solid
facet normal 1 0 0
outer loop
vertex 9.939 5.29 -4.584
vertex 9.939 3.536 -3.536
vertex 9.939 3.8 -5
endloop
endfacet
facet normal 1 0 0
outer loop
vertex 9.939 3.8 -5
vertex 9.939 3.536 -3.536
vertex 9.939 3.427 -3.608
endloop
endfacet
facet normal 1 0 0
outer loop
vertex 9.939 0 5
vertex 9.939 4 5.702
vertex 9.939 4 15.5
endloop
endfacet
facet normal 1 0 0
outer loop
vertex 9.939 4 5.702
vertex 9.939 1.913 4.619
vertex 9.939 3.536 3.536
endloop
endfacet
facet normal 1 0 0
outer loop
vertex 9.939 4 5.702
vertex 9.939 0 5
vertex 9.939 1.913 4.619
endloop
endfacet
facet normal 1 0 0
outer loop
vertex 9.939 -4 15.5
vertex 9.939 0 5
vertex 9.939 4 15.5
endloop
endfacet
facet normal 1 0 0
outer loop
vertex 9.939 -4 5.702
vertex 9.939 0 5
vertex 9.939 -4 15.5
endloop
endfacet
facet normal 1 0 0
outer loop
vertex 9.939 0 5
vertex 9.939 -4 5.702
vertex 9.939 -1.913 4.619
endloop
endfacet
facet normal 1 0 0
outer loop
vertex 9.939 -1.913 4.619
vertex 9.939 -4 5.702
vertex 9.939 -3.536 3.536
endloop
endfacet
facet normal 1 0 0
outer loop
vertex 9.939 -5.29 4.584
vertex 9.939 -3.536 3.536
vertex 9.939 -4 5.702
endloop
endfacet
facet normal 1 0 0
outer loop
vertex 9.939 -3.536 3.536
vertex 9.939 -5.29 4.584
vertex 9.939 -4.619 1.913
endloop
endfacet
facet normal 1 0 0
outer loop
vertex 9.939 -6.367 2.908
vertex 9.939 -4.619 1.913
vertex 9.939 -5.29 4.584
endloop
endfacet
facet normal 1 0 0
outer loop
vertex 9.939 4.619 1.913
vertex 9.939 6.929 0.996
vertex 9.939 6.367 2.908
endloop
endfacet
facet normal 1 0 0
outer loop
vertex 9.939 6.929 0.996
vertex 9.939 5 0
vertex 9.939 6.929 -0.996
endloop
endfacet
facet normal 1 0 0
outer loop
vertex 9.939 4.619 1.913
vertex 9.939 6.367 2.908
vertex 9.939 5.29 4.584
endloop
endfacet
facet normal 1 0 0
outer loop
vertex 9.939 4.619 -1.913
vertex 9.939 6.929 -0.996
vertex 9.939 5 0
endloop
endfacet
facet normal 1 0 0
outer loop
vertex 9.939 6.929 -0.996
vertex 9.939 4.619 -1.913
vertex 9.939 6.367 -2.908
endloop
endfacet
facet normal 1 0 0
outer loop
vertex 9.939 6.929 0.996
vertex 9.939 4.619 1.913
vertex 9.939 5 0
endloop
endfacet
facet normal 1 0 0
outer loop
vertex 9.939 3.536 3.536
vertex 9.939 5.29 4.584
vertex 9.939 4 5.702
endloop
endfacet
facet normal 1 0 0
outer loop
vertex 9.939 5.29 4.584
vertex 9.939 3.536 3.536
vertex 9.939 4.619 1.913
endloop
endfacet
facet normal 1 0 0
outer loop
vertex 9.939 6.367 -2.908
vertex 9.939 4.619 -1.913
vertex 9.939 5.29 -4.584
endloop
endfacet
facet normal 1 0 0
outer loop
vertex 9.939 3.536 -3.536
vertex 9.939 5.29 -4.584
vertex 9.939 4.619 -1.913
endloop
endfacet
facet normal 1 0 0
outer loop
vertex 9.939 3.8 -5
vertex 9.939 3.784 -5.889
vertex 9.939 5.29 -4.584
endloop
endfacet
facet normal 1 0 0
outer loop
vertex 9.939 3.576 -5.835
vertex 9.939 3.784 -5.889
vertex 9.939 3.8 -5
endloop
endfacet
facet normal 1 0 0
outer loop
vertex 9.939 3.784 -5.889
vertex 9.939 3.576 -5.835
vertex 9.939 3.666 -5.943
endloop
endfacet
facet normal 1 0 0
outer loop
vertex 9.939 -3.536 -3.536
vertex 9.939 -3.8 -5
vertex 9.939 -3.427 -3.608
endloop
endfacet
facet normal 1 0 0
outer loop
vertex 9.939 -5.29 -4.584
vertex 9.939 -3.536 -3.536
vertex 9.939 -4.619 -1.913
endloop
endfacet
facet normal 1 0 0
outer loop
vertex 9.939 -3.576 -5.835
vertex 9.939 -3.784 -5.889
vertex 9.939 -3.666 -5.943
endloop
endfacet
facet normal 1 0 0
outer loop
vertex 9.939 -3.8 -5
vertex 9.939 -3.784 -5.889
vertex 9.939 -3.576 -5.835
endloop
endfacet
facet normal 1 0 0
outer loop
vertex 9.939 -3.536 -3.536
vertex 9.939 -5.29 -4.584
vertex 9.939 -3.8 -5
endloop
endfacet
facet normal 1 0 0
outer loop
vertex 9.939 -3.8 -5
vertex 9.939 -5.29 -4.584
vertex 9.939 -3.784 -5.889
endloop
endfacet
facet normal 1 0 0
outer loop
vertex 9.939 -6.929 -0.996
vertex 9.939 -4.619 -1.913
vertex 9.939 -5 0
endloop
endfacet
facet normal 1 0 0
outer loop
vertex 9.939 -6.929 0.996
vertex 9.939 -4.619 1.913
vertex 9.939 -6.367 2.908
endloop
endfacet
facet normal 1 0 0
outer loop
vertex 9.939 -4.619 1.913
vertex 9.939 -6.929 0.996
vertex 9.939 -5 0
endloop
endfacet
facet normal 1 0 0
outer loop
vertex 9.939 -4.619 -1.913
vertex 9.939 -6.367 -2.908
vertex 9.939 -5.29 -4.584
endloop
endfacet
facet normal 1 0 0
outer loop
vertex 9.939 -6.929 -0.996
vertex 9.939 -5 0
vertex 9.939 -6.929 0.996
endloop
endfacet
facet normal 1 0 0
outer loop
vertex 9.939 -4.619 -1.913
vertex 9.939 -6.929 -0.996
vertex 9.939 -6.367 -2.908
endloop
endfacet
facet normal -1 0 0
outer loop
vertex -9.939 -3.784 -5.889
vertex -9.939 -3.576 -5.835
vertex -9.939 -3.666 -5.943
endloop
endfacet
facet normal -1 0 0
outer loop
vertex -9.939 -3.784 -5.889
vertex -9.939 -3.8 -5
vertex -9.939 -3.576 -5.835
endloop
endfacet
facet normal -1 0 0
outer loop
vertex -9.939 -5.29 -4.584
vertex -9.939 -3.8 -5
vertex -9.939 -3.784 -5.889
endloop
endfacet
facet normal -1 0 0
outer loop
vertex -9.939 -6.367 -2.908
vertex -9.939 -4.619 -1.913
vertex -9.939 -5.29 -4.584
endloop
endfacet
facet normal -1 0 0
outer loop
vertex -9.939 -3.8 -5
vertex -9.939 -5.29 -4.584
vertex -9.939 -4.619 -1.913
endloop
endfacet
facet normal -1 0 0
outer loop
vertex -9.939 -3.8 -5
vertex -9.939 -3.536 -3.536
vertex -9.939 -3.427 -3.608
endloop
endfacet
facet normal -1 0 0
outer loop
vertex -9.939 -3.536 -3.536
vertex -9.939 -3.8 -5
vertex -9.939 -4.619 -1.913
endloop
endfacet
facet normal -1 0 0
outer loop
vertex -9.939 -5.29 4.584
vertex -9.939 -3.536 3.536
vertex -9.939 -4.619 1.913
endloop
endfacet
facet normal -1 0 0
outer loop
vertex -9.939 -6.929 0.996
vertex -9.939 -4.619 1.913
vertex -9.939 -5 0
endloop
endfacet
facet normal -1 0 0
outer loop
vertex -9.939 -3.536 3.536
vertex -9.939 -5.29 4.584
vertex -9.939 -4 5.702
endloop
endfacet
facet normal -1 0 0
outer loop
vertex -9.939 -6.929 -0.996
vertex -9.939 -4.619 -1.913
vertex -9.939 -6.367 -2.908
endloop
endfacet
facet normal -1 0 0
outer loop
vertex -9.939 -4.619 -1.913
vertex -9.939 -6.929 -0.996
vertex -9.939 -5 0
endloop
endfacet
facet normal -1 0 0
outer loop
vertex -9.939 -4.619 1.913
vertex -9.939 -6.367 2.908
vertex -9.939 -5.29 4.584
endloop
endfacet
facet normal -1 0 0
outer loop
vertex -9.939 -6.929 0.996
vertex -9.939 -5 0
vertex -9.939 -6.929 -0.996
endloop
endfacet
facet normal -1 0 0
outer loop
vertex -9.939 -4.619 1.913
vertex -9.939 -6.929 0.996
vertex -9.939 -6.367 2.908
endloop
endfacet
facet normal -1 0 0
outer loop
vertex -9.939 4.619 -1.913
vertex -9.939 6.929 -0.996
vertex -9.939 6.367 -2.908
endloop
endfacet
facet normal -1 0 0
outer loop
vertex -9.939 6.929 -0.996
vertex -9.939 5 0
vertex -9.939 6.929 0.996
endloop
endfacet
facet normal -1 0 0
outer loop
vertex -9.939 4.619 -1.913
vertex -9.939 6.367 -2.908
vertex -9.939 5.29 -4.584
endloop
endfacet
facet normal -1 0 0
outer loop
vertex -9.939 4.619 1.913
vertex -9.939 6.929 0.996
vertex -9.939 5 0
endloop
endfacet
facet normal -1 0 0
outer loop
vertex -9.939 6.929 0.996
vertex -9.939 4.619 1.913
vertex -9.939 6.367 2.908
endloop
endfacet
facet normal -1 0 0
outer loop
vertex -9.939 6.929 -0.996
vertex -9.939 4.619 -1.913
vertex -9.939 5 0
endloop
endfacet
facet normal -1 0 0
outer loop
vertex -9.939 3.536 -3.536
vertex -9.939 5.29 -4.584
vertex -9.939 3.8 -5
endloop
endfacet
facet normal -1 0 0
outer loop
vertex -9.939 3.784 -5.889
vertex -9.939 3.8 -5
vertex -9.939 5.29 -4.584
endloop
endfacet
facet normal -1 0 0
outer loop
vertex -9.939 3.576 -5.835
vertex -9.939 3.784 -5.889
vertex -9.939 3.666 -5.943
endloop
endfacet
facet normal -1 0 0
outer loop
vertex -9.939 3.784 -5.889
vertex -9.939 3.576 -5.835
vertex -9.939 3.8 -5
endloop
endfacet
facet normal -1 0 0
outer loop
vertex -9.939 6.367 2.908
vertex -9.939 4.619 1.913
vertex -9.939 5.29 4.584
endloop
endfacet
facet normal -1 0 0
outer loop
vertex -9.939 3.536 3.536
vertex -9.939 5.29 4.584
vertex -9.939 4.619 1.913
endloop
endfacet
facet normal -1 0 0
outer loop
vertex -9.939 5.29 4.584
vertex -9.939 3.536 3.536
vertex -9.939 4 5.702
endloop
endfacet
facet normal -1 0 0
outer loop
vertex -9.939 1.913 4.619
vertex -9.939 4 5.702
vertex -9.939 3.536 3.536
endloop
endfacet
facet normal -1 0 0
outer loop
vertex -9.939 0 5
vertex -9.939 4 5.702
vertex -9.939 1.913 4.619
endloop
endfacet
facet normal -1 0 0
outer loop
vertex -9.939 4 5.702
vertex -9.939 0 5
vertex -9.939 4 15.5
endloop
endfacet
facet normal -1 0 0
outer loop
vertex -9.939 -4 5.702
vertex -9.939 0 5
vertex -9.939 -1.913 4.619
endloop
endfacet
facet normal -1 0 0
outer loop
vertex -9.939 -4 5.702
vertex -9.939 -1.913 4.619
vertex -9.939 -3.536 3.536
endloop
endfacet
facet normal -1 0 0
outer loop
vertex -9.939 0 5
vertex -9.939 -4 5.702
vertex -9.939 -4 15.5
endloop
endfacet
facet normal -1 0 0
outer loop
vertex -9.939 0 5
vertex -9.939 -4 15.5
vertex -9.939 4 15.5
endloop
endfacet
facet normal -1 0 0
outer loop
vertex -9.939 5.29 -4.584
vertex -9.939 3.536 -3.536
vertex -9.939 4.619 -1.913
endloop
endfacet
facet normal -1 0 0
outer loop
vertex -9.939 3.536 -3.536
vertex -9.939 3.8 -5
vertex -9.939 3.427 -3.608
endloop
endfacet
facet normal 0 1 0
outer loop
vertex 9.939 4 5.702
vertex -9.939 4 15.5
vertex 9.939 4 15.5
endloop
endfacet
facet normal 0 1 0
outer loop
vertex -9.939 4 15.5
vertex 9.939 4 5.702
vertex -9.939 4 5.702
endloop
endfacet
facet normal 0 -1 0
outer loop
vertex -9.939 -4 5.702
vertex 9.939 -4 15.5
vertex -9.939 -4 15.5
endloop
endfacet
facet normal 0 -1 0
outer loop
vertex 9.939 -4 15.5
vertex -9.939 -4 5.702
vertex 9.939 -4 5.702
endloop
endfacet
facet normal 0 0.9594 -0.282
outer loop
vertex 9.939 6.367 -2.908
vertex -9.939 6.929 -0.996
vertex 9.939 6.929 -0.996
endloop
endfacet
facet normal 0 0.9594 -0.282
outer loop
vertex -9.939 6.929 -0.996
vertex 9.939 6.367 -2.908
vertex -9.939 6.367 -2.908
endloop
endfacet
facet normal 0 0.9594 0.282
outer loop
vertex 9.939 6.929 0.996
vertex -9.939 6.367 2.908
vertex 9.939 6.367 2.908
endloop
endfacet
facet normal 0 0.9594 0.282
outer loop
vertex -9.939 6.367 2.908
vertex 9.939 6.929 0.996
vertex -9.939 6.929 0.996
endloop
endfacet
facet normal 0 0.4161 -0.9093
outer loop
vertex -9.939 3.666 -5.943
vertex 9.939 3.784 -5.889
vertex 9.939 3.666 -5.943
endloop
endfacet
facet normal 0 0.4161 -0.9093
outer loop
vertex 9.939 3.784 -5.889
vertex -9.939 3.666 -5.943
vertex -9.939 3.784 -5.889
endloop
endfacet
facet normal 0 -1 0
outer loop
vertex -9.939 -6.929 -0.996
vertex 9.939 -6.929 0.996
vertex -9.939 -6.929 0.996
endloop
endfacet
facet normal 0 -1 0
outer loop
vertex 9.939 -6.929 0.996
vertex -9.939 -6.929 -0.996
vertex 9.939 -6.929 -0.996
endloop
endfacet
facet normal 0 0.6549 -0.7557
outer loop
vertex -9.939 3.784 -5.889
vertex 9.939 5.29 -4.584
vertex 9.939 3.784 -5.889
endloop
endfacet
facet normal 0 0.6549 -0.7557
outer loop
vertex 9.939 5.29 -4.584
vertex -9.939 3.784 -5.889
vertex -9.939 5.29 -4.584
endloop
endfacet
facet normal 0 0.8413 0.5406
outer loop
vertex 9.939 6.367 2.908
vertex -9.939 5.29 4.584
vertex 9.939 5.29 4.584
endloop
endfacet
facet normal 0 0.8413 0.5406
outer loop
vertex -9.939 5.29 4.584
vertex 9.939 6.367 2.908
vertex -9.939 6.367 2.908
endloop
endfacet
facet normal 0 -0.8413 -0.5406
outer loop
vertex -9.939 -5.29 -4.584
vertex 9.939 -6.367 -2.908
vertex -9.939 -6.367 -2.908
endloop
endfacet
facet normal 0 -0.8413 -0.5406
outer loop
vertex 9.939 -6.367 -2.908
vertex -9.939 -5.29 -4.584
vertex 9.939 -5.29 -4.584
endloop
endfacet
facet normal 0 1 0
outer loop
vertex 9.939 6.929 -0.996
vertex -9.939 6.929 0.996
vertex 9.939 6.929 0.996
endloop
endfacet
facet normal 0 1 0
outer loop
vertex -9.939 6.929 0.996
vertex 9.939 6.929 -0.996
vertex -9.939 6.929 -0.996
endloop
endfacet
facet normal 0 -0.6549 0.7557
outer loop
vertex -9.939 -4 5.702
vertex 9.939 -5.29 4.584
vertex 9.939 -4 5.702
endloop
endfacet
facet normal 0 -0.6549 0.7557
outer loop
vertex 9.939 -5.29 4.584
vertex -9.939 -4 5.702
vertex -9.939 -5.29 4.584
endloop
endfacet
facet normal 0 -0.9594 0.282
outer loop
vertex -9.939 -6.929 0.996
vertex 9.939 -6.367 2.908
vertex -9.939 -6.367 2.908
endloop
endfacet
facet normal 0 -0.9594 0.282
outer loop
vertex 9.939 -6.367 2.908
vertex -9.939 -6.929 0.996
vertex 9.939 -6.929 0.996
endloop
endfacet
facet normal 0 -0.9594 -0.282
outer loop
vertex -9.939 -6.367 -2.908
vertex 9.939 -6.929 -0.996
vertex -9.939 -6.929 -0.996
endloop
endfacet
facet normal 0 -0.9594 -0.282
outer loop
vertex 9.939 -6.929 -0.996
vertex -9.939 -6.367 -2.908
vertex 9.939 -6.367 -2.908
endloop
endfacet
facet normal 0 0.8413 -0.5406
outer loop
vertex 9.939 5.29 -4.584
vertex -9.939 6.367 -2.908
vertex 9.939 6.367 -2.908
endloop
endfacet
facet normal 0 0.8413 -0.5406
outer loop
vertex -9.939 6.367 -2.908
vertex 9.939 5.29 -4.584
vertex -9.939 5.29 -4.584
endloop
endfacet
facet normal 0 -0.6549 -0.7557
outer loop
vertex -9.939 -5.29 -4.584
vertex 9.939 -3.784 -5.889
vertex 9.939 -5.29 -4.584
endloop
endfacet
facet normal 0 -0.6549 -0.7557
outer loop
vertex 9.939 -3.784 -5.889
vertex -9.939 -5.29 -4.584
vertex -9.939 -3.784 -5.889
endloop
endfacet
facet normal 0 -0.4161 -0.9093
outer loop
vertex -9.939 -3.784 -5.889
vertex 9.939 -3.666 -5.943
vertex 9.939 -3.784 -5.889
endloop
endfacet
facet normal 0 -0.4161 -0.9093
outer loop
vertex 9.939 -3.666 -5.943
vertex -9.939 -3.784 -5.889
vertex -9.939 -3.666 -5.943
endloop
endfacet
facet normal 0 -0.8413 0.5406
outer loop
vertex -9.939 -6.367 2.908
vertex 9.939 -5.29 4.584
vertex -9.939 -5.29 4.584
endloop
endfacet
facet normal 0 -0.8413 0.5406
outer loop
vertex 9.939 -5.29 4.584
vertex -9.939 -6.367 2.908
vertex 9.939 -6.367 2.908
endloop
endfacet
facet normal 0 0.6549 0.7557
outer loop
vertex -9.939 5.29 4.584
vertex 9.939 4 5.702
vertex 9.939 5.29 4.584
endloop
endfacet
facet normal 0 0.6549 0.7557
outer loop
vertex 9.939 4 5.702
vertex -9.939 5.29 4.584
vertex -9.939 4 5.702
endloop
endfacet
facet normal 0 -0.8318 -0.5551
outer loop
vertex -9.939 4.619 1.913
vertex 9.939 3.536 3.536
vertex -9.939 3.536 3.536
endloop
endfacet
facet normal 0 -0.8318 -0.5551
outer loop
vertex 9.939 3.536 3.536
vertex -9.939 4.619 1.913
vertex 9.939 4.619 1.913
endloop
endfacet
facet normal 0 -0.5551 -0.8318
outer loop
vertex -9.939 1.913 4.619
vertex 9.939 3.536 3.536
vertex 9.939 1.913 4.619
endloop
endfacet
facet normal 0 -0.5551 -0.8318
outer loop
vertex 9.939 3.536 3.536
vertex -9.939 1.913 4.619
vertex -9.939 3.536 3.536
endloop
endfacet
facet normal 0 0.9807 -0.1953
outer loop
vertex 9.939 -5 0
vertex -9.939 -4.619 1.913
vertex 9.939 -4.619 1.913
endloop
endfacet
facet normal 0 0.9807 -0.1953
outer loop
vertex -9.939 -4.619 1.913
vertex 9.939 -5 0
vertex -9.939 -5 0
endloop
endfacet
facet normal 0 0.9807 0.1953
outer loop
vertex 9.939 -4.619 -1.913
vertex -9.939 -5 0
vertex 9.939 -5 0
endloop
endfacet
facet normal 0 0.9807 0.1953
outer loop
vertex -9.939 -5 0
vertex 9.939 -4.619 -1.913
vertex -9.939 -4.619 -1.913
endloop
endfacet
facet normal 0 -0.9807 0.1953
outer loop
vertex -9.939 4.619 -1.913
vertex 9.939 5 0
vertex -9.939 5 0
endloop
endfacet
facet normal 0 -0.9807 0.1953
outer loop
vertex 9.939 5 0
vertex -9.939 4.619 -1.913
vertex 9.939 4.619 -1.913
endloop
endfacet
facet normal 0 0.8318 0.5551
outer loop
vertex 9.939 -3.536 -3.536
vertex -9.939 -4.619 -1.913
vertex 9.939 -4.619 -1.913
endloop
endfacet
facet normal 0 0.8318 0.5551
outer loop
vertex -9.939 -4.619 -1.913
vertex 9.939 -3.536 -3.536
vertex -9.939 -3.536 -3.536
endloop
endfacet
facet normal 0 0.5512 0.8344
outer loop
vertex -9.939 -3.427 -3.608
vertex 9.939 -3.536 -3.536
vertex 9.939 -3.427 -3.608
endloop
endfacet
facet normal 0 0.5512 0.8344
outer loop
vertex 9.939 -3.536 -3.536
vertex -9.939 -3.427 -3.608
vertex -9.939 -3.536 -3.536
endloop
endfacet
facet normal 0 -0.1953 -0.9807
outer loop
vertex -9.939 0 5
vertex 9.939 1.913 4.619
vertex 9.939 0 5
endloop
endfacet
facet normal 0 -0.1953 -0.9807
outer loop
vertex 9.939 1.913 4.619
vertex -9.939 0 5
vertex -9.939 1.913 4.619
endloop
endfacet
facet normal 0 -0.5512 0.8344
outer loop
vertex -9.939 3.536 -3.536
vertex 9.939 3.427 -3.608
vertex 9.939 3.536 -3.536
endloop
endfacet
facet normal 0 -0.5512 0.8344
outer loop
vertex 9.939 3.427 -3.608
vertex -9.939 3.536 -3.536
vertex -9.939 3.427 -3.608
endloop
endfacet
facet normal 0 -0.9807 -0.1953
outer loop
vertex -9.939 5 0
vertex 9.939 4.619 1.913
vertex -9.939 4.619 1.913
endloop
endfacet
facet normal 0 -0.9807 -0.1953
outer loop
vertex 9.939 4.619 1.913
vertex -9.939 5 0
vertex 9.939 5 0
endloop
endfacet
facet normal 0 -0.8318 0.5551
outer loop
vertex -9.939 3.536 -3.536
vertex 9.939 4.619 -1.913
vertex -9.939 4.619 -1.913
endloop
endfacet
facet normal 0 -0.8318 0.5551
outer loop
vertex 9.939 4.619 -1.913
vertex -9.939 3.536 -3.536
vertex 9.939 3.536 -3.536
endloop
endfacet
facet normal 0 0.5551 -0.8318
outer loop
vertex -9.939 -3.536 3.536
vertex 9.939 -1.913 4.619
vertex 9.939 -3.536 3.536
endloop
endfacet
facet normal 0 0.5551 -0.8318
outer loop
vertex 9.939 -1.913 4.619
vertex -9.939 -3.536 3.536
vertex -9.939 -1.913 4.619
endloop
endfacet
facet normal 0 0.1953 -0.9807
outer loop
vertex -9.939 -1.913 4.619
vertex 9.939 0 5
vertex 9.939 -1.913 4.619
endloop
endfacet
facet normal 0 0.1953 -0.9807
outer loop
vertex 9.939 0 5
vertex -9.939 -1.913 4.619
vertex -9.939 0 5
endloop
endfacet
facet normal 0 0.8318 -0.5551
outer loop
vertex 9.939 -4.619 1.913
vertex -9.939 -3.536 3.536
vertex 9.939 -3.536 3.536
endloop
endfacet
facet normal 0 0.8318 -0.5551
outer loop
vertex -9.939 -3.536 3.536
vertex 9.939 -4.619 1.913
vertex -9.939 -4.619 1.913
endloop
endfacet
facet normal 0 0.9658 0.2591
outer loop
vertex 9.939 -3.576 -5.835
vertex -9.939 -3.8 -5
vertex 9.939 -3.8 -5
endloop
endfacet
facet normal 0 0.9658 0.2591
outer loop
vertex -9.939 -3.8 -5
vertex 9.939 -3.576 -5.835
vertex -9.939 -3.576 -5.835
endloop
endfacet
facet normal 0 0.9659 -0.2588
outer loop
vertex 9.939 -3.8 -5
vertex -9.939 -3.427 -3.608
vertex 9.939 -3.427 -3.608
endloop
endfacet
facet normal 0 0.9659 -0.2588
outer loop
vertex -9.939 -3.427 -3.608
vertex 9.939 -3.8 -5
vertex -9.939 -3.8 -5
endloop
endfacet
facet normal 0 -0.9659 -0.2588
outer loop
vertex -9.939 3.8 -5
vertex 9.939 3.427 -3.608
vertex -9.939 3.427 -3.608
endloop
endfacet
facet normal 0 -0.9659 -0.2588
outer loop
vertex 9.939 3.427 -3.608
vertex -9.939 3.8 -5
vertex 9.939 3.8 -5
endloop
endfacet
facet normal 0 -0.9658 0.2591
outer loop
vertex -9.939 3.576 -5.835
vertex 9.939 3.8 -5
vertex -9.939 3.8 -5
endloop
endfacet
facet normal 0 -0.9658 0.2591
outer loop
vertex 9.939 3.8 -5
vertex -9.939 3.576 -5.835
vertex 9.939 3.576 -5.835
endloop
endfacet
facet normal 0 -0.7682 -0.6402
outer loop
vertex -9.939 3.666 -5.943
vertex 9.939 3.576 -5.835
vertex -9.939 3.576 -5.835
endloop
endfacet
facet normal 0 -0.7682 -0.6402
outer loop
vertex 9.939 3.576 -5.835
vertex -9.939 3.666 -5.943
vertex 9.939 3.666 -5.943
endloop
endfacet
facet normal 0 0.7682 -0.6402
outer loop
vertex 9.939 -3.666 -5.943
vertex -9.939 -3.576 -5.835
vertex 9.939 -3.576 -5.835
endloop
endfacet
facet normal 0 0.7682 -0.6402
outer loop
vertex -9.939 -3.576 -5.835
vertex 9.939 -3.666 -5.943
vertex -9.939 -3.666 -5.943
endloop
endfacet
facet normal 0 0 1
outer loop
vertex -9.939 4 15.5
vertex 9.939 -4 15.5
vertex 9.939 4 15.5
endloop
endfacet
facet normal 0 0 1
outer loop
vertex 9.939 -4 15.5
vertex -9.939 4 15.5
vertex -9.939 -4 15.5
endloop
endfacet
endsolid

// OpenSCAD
// file: 3dprinter.scad
//===============================================//
//===============================================//
//     BioDeploy SCAD file = 3dprinter.scad      //
//                 Start File                    //
//===============================================//
//===============================================//
//choose the max specs for your 3d printer
//here we use a replicator2x specs
x_print_max = 24.6*10;
y_print_max = 15.2*10;
z_print_max = 15.5*10;
//don't forget *10 to put unit in centimeters
//-----------------------------------------------//
//===============================================//
//===============================================//
//     BioDeploy SCAD file = 3dprinter.scad      //
//                   End  File                   //
//===============================================//
//===============================================//
// main file
//===============================================//
//===============================================//
//BioDeploy SCAD file = hydrolyseur_top_core_base_support_attach.scad//
//                 Start File                    //
//===============================================//
//===============================================//
//-----------------------------------------------//
//===============================================//
include <3dprinter.scad>
//===============================================//
//                 variables                     //
//===============================================//
include <hydrolyseur_variables.scad>
//===============================================//
//               Calls for use                   //
//===============================================//
//===============================================//
//                    Trees                      //
//===============================================//

module base_fixation() {
difference() {
union() {

translate([-x_h2o_top_int_fix/2,-4,0])cube([x_h2o_top_int_fix,8,8],center=false);
color("Aqua",1)rotate([0,90,0])cylinder(x_h2o_top_int_fix,7,7,center=true);}

union() {
translate([0,0,0])rotate([0,90,0])cylinder(50,5,5,center=true);
translate([0,0,-5])rotate([0,90,0])cylinder(50,3.8,3.8,center=true);
translate([0,0,-10])rotate([0,90,0])cylinder(50,5.5,5.5,center=true);}
}}

base_fixation();

module base_fixation_ext() {
difference() {
union() {

translate([-x_h2o_top_int_fix/2,-4,0])cube([x_h2o_top_int_fix,8,15.5],center=false);
color("Aqua",1)rotate([0,90,0])cylinder(x_h2o_top_int_fix,7,7,center=true);}

union() {
translate([0,0,0])rotate([0,90,0])cylinder(50,5,5,center=true);
translate([0,0,-5])rotate([0,90,0])cylinder(50,3.8,3.8,center=true);
translate([0,0,-10])rotate([0,90,0])cylinder(50,5.5,5.5,center=true);}
}}

base_fixation_ext();
//-----------------------------------------------//
//===============================================//
//===============================================//
//BioDeploy SCAD file = hydrolyseur_top_core_base_support_attach.scad//
//                    End File                   //
//===============================================//
//===============================================//
